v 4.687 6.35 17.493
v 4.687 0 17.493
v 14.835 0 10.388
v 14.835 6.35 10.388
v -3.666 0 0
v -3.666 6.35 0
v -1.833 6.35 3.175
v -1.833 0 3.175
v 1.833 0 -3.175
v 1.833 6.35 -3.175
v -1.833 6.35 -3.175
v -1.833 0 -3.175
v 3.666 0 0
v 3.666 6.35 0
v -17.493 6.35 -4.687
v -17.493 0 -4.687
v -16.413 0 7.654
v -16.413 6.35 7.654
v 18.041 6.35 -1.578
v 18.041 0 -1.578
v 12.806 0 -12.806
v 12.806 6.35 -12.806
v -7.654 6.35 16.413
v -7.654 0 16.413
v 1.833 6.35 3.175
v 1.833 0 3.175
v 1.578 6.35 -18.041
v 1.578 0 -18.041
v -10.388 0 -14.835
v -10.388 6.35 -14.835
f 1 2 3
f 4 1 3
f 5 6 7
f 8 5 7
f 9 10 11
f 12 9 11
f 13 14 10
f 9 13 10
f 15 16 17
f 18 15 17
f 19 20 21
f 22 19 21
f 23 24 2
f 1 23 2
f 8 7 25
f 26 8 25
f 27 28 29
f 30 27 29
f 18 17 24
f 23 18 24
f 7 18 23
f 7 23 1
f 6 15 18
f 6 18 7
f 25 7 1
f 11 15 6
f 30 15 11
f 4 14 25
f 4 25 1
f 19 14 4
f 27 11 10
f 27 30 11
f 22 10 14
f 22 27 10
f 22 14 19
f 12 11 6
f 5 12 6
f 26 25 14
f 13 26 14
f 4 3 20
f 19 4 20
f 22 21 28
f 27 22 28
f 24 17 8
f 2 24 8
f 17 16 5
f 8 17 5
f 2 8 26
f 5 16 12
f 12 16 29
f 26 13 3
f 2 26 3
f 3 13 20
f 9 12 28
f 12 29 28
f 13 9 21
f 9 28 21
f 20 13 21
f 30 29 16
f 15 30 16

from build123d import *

# Parameters (mm, degrees)
BOSS_EXTRUDE1_DEPTH = 6.35
CUT_EXTRUDE1_DEPTH  = 6.35


with BuildPart() as part:
    # Sketch1 → Boss-Extrude1 (new body)
    with BuildSketch(Plane(origin=(0, 0, 0), x_dir=(1, 0, 0), z_dir=(0, 1, 0))):
        Polygon((14.834988784, -10.387570976), (18.04126264, 1.578405957), (12.8058292, 12.8058292), (1.578405957, 18.04126264), (-10.387570976, 14.834988784), (-17.493088004, 4.687258804), (-16.413394741, -7.653691664), (-7.653691664, -16.413394741), (4.687258804, -17.493088004), align=None)
    extrude(amount=BOSS_EXTRUDE1_DEPTH)

    # Sketch2 → Cut-Extrude1 (cut)
    with BuildSketch(Plane(origin=(0, 6.35, 0), x_dir=(1, 0, 0), z_dir=(0, 1, 0))):
        Polygon((1.833087105, 3.175), (-1.833087105, 3.175), (-3.666174209, 0), (-1.833087105, -3.175), (1.833087105, -3.175), (3.666174209, 0), align=None)
    extrude(amount=-CUT_EXTRUDE1_DEPTH, mode=Mode.SUBTRACT)


solid = part.part
